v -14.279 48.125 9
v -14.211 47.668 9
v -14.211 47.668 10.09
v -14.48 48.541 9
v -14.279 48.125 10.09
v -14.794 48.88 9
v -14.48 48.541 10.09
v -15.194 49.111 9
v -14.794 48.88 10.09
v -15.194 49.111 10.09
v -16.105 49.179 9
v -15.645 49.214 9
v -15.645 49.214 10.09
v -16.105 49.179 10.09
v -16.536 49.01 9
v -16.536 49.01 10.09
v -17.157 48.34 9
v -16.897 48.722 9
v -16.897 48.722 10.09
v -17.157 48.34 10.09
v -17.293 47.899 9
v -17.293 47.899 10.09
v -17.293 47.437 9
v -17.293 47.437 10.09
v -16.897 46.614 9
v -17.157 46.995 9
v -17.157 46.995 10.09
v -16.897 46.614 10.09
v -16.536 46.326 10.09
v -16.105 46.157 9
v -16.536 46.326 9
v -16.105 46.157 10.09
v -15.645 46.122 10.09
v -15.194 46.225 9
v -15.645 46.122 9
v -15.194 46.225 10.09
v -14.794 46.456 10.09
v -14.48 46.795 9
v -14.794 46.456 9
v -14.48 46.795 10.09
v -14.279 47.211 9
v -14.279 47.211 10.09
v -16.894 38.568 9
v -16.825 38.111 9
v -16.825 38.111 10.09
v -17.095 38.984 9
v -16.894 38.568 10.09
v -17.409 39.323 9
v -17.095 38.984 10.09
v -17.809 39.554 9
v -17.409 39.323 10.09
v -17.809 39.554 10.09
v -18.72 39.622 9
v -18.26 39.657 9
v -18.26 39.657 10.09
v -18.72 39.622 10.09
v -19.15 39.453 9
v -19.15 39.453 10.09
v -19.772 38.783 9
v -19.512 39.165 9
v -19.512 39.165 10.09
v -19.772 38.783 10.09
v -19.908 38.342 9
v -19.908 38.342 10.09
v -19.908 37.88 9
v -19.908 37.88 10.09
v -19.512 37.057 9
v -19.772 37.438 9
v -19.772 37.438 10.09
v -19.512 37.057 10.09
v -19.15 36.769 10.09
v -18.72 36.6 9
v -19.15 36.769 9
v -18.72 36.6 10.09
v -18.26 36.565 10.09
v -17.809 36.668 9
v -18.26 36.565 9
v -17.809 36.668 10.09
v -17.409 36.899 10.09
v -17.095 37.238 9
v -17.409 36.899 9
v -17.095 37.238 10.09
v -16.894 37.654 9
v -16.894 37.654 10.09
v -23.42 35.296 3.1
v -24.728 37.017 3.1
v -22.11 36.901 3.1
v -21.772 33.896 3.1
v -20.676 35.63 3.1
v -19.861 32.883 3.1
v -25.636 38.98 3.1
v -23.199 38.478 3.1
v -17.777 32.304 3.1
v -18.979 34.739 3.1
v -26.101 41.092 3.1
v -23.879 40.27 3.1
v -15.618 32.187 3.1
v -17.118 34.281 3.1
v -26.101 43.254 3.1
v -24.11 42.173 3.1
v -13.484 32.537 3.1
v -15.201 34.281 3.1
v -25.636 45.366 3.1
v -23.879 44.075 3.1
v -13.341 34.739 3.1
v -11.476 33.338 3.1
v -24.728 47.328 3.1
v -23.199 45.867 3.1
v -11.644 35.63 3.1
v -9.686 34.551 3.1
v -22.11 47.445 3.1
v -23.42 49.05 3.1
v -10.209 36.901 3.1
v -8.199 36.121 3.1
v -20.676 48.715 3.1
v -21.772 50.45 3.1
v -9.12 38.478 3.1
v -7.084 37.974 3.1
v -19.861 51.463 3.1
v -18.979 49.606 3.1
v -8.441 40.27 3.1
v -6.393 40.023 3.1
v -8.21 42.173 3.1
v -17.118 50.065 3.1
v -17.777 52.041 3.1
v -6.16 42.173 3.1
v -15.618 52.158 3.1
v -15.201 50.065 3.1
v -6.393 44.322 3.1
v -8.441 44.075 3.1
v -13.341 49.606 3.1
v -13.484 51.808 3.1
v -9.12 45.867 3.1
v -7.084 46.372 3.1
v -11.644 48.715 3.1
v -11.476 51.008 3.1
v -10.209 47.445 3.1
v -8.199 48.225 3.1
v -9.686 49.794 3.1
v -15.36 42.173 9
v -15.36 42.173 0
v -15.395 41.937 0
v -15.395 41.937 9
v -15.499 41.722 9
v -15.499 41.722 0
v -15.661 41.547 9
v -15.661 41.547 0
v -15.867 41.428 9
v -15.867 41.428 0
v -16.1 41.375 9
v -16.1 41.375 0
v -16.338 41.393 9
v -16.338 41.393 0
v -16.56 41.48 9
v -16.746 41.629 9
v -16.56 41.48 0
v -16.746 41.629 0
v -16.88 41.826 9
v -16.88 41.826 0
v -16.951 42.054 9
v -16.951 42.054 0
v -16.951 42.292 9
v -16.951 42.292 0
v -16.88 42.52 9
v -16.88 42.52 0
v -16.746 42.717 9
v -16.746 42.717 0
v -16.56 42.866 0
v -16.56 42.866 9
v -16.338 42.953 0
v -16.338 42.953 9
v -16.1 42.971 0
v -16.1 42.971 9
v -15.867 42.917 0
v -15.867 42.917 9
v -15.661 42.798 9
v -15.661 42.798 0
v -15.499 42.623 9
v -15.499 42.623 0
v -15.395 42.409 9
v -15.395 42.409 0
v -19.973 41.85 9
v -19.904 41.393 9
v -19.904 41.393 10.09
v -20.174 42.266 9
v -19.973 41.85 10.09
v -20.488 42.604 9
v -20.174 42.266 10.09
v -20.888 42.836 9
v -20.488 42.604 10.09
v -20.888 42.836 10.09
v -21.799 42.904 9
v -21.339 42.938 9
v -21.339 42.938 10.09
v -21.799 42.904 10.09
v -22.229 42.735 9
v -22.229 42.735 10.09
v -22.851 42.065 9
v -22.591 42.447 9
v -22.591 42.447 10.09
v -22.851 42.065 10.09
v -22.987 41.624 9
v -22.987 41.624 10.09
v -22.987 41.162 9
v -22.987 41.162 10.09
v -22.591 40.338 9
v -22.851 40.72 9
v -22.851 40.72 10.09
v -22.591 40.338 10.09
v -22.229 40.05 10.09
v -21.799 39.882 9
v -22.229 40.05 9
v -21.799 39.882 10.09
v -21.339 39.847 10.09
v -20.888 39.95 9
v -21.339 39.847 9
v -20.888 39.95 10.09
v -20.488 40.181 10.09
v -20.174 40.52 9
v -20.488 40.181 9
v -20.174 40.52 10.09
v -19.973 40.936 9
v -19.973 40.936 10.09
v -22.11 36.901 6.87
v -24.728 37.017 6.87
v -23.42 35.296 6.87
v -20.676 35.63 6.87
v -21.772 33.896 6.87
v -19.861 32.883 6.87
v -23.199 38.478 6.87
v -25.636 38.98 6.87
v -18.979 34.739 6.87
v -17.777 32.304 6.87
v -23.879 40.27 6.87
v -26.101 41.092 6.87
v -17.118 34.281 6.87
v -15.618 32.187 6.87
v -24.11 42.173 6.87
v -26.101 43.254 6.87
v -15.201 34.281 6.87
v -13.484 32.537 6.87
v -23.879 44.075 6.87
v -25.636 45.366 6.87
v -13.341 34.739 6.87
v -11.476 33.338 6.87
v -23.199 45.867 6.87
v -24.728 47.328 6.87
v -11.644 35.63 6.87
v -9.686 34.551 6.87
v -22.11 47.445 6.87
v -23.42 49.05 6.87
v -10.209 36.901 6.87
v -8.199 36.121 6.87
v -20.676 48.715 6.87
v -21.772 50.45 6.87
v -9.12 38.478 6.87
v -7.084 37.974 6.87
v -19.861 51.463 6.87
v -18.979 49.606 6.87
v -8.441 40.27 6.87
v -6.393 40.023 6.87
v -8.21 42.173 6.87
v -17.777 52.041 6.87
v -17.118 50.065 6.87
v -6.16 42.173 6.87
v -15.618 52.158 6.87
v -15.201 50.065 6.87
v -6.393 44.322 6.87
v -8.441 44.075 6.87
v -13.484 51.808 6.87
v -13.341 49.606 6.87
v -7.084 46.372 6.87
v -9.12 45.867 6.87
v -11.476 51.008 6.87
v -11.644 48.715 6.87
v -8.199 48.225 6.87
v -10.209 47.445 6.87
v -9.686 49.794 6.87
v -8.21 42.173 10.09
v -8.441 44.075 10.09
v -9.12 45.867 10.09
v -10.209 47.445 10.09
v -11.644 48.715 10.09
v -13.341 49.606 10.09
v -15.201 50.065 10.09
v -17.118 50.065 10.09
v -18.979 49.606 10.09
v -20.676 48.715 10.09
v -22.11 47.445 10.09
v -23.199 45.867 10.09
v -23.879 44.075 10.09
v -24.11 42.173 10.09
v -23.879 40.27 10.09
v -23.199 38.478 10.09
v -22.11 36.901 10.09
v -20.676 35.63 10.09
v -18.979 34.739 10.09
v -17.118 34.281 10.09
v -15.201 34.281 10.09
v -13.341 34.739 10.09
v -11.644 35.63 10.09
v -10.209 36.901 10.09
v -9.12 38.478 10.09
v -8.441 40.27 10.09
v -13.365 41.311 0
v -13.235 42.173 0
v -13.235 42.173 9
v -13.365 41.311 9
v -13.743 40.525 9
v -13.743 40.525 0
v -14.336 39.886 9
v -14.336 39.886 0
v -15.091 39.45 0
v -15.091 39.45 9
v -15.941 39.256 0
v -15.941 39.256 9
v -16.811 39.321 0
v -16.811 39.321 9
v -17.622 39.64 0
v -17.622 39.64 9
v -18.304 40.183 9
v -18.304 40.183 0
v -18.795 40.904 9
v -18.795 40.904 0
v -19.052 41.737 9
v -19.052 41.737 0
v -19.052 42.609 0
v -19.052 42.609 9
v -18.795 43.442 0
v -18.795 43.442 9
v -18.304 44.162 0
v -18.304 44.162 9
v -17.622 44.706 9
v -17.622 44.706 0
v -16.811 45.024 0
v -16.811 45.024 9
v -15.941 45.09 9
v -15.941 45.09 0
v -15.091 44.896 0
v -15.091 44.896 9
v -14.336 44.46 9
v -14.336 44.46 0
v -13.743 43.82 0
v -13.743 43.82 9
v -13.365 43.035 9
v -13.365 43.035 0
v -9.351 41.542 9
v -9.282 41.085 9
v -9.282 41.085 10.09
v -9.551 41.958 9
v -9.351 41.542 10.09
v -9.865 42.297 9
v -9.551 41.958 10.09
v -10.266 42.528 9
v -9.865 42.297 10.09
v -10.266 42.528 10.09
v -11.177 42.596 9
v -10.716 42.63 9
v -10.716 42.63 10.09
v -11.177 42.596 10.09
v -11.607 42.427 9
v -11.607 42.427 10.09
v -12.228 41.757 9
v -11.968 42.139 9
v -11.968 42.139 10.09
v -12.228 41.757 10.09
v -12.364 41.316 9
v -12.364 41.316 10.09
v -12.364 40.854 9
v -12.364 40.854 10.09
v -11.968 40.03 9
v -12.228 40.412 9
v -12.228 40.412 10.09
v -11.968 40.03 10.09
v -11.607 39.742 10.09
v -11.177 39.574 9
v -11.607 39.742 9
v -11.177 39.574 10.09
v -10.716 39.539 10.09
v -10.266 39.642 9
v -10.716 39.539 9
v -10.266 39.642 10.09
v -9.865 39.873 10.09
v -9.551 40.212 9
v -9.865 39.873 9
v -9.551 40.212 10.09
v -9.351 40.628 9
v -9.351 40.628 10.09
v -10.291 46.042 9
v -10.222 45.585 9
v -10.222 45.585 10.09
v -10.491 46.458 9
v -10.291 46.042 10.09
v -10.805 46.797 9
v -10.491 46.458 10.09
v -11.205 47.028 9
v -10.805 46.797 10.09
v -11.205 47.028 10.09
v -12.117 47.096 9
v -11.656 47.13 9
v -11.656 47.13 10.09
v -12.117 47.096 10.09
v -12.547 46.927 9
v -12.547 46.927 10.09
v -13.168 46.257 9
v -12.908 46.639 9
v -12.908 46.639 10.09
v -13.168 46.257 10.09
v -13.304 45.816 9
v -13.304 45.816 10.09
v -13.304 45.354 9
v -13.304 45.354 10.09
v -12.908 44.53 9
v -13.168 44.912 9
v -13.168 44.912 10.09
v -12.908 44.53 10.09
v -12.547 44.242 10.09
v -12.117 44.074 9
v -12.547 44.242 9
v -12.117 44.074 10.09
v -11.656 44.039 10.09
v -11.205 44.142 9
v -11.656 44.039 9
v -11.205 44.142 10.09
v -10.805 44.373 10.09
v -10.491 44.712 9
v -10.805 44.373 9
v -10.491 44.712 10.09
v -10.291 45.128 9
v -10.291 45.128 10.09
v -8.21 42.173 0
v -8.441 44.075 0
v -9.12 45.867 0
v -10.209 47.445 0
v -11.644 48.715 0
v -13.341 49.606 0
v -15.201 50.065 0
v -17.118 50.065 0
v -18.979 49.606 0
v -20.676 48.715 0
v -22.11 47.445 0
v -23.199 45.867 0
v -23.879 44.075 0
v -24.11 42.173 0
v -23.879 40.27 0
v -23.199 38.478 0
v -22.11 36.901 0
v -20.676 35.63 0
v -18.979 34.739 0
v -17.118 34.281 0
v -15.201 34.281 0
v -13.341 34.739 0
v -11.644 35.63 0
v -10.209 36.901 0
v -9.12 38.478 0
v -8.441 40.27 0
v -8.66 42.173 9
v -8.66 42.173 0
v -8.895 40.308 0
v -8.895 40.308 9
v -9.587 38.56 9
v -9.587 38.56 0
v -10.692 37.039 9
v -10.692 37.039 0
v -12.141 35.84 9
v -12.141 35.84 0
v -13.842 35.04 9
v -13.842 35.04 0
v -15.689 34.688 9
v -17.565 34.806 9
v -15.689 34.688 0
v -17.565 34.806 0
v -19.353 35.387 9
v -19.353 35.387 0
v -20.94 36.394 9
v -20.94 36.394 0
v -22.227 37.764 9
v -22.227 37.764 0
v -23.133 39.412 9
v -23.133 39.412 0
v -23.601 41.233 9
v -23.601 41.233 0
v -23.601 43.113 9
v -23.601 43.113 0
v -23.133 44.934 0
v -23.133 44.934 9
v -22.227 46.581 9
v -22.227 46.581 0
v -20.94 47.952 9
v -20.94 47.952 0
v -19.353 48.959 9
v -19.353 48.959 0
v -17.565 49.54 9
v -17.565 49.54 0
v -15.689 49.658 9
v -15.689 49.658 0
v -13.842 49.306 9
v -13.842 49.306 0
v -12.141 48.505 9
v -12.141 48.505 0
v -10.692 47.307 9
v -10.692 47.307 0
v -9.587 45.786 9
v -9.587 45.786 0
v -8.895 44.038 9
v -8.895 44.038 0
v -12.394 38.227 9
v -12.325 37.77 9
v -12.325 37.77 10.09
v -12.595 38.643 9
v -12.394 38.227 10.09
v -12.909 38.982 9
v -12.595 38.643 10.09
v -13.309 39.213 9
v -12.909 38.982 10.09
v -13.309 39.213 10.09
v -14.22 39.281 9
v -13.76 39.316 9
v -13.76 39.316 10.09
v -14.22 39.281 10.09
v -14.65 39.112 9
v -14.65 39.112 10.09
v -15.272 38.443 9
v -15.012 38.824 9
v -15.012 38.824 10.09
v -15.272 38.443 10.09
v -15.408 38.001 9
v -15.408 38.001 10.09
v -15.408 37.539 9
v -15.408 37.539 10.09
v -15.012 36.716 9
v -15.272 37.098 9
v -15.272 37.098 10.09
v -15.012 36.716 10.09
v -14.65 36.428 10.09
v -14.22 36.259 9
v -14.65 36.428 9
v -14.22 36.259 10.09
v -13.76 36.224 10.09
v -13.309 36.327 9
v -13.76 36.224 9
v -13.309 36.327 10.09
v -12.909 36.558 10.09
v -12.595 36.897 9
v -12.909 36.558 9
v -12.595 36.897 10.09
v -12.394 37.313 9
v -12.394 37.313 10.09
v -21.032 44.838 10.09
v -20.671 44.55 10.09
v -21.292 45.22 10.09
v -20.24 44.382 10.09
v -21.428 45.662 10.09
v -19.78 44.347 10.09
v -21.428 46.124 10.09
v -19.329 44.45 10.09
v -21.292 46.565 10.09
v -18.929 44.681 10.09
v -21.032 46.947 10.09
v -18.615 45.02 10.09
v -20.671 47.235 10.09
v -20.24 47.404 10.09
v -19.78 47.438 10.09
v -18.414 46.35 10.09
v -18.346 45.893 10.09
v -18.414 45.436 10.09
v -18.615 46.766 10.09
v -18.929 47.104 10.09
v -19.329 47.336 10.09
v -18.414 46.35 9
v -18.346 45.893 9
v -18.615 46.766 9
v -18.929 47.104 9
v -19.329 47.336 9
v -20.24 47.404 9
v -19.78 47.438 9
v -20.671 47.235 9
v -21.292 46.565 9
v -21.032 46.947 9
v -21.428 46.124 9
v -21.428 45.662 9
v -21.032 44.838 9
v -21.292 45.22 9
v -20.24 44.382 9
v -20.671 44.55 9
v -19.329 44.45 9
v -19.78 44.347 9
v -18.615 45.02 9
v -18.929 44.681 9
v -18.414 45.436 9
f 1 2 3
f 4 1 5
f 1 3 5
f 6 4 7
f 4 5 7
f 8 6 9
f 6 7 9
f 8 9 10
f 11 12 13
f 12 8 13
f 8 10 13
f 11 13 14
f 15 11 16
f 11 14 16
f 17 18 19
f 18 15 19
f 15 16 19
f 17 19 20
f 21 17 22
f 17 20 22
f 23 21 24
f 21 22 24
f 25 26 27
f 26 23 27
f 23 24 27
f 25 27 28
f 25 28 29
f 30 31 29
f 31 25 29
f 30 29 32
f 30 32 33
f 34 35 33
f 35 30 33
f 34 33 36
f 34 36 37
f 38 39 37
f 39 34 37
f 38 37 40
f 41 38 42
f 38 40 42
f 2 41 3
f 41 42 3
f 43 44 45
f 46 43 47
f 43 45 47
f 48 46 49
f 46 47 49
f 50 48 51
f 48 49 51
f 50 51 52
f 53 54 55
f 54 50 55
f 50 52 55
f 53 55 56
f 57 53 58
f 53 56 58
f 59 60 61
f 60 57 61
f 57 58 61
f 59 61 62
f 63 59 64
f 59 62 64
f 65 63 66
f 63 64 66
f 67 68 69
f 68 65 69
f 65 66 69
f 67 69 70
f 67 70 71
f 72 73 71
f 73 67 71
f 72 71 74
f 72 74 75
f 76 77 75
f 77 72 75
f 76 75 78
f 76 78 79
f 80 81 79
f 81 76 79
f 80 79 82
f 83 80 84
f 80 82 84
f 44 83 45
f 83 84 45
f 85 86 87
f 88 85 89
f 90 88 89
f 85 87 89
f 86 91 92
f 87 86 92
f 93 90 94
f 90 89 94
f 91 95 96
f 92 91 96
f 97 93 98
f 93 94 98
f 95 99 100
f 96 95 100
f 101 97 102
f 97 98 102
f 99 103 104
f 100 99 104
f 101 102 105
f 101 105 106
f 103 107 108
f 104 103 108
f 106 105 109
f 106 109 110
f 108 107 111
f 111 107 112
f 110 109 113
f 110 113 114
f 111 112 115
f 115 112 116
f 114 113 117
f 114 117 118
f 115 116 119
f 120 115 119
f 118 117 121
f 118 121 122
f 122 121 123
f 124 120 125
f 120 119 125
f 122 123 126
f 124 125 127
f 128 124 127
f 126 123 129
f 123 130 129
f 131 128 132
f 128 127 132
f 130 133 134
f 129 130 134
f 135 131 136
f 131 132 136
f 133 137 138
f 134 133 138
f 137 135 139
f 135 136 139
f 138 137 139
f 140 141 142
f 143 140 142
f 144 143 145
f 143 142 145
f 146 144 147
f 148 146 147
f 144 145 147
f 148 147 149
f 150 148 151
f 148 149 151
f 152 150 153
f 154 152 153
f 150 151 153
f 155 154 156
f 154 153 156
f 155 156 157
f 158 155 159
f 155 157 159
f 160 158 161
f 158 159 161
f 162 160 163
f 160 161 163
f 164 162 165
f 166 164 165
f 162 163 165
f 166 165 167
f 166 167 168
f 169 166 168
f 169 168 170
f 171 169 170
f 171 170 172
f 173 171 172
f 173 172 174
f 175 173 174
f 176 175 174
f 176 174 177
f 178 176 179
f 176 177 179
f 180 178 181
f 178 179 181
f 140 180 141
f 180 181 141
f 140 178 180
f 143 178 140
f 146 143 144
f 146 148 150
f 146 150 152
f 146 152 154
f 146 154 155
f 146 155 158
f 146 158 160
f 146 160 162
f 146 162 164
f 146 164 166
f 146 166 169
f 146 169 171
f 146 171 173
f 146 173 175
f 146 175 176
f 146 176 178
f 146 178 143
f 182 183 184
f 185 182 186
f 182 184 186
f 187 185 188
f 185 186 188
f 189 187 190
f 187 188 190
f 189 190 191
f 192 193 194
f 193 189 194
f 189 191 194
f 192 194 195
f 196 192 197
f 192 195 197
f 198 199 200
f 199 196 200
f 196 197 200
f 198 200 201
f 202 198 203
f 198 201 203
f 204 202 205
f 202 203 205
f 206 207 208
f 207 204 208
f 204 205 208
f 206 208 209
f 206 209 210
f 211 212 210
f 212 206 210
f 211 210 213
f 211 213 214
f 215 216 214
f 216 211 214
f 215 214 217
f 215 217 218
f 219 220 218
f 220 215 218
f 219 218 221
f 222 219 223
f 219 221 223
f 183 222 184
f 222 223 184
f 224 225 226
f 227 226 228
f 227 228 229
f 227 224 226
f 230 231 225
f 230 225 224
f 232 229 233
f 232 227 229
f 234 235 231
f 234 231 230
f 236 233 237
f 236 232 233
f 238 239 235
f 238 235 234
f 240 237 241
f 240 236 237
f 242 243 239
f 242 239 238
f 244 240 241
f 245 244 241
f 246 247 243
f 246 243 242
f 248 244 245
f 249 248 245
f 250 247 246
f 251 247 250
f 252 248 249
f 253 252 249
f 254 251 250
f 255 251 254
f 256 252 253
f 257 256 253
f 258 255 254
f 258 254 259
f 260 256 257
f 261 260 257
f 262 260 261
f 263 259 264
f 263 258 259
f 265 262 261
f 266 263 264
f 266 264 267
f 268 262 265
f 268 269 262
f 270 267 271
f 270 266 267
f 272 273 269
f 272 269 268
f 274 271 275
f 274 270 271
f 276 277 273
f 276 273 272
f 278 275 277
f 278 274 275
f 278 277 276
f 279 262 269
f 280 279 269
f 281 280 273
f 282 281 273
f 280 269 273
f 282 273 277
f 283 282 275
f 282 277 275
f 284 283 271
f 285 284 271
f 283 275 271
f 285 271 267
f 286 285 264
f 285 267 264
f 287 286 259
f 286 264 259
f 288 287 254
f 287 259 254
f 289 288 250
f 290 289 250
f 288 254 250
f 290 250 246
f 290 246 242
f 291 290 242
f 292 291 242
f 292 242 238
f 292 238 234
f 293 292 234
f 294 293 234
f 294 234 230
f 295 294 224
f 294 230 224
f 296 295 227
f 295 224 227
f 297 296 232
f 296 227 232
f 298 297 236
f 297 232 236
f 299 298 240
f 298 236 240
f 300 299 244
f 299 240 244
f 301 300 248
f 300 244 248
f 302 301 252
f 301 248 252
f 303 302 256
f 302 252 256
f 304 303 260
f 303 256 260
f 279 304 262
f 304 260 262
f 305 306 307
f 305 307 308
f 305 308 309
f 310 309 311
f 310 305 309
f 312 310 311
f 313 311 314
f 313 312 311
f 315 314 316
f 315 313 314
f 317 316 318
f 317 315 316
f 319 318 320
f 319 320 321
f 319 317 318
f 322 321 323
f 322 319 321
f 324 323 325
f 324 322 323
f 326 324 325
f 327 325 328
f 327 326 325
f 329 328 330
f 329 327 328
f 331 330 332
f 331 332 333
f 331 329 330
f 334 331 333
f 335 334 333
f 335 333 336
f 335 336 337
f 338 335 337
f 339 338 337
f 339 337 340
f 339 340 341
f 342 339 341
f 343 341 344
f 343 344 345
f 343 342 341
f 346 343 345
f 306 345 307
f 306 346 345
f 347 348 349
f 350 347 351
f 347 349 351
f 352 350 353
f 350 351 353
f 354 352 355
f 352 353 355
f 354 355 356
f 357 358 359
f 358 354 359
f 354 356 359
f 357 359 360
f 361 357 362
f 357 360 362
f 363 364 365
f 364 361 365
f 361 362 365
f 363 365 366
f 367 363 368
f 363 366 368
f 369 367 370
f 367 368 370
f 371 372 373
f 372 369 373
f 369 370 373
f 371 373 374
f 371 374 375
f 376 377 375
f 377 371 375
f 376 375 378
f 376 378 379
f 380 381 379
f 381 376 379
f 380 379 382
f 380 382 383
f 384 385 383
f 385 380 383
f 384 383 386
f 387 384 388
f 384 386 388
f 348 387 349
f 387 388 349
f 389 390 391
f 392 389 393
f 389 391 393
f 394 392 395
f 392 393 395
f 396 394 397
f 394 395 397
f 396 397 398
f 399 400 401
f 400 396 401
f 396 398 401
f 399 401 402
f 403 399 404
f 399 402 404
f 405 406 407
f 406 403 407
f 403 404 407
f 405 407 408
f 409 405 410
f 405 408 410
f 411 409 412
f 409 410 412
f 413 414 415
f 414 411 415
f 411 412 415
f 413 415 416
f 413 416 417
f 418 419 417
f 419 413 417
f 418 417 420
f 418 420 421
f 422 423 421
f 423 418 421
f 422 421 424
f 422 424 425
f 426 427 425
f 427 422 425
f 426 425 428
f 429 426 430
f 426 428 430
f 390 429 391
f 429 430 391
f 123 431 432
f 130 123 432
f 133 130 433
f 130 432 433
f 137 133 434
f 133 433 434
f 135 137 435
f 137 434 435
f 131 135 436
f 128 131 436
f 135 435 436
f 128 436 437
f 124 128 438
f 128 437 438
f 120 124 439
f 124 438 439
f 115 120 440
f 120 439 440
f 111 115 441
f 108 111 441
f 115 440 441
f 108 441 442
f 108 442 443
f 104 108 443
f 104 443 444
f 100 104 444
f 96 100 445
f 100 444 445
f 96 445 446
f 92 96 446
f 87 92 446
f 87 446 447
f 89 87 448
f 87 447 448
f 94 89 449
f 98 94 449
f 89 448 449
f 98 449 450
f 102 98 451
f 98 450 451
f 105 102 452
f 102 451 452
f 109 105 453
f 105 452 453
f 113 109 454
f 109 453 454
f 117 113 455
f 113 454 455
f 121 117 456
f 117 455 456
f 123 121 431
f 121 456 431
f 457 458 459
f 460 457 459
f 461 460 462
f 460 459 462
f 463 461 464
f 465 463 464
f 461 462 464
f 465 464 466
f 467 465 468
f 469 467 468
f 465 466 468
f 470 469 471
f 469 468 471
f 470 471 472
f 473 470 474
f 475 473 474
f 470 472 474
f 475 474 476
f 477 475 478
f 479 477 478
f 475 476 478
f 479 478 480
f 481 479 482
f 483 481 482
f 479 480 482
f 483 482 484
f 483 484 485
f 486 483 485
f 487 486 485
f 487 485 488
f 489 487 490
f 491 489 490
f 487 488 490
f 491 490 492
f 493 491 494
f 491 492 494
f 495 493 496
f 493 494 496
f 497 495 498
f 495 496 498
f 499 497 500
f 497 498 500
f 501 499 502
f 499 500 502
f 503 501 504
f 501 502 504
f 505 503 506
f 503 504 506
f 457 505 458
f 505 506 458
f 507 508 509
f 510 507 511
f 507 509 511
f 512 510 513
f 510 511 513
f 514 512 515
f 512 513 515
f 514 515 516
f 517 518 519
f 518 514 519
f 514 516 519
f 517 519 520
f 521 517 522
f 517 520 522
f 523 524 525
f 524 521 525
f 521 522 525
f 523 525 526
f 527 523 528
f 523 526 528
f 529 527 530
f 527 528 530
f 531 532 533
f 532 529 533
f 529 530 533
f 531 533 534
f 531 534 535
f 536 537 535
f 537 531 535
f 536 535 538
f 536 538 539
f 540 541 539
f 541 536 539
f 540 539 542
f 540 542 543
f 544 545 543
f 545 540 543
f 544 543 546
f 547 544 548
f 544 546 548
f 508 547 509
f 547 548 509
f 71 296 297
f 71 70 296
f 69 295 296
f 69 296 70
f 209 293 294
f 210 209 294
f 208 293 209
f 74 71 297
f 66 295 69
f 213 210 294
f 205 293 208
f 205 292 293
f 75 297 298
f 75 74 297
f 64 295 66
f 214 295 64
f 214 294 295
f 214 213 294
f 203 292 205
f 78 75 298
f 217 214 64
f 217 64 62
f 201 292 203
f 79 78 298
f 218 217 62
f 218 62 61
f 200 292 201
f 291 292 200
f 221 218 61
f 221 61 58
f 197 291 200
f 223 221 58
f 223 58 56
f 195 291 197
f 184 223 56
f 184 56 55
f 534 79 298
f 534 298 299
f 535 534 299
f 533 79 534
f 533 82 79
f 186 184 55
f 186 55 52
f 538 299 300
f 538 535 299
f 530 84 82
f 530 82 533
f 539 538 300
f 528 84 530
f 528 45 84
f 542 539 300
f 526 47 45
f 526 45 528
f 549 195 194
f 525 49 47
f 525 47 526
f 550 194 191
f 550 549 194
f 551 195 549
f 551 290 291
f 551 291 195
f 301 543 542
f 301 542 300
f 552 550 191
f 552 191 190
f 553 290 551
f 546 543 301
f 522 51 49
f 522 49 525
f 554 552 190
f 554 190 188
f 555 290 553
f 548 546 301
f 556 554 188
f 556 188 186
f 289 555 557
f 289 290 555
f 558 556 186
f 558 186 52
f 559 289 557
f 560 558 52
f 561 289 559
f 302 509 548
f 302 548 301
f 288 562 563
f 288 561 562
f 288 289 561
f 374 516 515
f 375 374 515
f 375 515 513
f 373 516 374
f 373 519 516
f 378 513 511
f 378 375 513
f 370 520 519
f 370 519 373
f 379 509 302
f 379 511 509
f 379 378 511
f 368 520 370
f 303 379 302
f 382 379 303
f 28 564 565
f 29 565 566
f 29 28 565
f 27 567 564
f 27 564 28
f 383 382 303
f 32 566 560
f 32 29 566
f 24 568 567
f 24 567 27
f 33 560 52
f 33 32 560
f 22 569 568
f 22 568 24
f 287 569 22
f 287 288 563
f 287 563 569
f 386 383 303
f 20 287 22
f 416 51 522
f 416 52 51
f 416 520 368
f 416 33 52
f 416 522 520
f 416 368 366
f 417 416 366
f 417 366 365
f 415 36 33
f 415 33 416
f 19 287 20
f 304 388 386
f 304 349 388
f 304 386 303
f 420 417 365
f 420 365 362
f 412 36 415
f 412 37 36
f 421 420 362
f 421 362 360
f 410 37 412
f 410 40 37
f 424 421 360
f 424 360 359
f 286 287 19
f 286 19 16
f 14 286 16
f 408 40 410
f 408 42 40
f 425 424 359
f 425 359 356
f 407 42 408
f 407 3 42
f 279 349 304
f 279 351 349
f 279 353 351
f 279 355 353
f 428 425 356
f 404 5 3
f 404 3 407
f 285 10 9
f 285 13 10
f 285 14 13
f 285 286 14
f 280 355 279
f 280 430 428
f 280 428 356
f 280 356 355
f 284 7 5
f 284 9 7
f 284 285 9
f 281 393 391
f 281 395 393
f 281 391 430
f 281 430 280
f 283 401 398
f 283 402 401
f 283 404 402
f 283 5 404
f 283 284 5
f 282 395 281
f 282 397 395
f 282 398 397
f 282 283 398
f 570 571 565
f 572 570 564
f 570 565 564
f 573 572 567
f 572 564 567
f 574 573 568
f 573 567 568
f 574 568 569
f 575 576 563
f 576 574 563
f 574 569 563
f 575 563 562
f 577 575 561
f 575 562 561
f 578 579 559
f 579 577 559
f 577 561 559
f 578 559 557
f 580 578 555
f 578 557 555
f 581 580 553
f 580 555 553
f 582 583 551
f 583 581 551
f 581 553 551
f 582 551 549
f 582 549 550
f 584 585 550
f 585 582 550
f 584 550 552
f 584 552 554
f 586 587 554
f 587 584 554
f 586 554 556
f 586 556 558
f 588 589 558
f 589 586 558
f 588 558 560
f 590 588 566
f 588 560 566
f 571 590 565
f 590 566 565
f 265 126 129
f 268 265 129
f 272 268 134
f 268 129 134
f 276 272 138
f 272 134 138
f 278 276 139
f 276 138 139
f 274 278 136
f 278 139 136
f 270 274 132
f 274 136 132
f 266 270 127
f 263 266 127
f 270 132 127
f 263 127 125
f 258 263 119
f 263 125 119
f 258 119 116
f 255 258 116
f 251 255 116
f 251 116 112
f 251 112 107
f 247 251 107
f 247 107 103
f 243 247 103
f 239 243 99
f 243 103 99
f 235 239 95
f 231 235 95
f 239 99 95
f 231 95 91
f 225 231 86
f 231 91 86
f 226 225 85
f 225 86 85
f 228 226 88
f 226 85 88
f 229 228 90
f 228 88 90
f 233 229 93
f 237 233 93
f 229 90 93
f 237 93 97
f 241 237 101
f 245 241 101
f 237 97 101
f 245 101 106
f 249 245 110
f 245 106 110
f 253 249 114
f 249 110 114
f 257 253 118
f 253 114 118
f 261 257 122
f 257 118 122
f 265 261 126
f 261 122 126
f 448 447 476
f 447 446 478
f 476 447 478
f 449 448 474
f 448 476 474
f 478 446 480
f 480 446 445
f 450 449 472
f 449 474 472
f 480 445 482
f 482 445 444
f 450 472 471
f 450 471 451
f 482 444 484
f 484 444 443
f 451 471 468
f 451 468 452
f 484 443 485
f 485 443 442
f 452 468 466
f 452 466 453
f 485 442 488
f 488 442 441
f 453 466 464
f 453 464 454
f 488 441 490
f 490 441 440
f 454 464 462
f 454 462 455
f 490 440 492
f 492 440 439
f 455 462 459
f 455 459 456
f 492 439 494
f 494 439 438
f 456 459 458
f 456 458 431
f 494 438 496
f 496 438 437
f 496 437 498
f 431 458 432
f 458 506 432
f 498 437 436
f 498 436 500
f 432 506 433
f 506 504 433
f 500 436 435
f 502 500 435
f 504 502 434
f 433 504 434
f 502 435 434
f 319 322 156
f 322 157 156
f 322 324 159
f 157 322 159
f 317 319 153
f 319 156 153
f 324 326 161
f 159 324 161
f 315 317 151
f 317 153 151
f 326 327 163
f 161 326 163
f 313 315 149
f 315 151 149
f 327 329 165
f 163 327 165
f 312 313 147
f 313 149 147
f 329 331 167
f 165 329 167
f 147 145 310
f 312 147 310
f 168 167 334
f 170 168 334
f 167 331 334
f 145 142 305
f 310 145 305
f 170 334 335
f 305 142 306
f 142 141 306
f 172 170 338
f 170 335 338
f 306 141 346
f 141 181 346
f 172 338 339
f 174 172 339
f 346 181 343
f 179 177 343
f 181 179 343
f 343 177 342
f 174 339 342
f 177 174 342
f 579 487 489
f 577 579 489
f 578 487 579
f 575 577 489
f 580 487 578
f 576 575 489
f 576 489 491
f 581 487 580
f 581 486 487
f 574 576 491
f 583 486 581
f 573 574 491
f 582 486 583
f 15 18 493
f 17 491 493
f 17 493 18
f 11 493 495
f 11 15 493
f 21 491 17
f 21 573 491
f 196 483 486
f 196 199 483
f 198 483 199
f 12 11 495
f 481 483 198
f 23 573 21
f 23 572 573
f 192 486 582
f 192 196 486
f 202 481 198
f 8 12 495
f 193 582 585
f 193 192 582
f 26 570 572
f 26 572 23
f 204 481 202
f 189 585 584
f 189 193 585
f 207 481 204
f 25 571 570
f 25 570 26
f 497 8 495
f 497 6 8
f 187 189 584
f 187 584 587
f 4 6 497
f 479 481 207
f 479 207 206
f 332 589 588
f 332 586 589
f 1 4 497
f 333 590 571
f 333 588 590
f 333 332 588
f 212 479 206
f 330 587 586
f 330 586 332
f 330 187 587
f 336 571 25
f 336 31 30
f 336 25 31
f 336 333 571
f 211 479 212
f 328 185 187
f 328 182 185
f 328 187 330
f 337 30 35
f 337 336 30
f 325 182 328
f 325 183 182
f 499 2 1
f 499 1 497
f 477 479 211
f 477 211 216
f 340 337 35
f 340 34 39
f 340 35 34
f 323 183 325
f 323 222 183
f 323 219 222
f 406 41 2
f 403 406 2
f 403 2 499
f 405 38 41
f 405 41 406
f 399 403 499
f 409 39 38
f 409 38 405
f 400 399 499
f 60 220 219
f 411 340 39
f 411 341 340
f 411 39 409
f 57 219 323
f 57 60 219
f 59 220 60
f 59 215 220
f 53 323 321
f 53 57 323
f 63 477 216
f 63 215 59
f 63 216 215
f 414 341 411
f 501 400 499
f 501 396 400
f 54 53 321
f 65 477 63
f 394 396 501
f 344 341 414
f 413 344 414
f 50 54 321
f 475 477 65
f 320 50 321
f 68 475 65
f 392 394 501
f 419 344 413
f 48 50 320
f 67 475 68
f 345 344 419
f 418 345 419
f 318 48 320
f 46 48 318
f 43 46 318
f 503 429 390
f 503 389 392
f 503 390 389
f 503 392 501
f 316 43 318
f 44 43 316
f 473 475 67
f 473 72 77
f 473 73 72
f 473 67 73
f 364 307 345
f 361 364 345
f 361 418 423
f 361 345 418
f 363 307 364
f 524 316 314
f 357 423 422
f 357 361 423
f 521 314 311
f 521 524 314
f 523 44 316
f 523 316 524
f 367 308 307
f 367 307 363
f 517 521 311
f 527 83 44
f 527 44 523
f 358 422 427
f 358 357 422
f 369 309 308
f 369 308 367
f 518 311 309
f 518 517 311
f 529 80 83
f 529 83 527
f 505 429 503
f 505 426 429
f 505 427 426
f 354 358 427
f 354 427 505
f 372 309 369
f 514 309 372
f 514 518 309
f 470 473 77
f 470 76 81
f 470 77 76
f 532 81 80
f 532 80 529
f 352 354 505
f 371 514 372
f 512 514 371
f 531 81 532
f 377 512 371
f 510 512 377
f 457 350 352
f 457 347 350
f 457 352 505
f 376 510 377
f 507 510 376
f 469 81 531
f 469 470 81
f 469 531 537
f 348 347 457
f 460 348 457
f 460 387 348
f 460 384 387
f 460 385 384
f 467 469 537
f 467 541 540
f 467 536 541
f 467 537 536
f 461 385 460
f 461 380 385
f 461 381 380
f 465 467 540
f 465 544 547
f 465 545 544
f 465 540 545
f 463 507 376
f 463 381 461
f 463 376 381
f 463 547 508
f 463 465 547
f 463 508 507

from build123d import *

# Parameters (mm, degrees)
F0_R     = 7.95
F1_DEPTH = 3.1
F2_R     = 10
F3_DEPTH = 3.77
F4_R     = 7.95
F5_DEPTH = 3.22
F6_R     = 1.55
F7_DEPTH = 25
F8_R     = 7.5
F8_R_2   = 1.55
F8_R_3   = 2.925
F8_R_4   = 0.8
F9_DEPTH = 9


with BuildPart() as f1:
    # F0 (on Top) → F1 (new body)
    with BuildSketch(Plane.XY):
        with Locations((-16.1596555263, 42.1727597713)):
            Circle(F0_R)
    extrude(amount=F1_DEPTH)

    # F2 (on face) → F3 (join)
    with BuildSketch(Plane.XY.offset(3.1)):
        with Locations((-16.1596555263, 42.1727597713)):
            Circle(F2_R)
    extrude(amount=F3_DEPTH)

    # F4 (on face) → F5 (join)
    with BuildSketch(Plane.XY.offset(6.87)):
        with Locations((-16.1596555263, 42.1727597713)):
            Circle(F4_R)
    extrude(amount=F5_DEPTH)

    # F6 (on face) → F7 (cut)
    with BuildSketch(Plane.XY.offset(10.09)):
        with Locations((-15.7605068353, 47.6678920378)):
            Circle(F6_R)
        with Locations((-19.8955421826, 45.8926504552)):
            Circle(F6_R)
        with Locations((-21.4543696493, 41.3926504552)):
            Circle(F6_R)
        with Locations((-18.3753594756, 38.1109289024)):
            Circle(F6_R)
        with Locations((-13.8753594756, 37.7701377139)):
            Circle(F6_R)
        with Locations((-10.8317825943, 41.0847477615)):
            Circle(F6_R)
        with Locations((-11.7717087802, 45.5847477615)):
            Circle(F6_R)
    extrude(amount=-F7_DEPTH, mode=Mode.SUBTRACT)

    # F8 (on face) → F9 (cut)
    with BuildSketch(Plane(origin=(0, 0, 0), x_dir=(1, 0, 0), z_dir=(0, 0, -1))):
        with Locations((-16.1596555263, -42.1727597713)):
            Circle(F8_R)
        with Locations((-19.8955421826, -45.8926504552)):
            Circle(F8_R_2, mode=Mode.SUBTRACT)
        with Locations((-16.1596555263, -42.1727597713)):
            Circle(F8_R_3, mode=Mode.SUBTRACT)
        with Locations((-15.7605068353, -47.6678920378)):
            Circle(F8_R_2, mode=Mode.SUBTRACT)
        with Locations((-11.7717087802, -45.5847477615)):
            Circle(F8_R_2, mode=Mode.SUBTRACT)
        with Locations((-21.4543696493, -41.3926504552)):
            Circle(F8_R_2, mode=Mode.SUBTRACT)
        with Locations((-18.3753594756, -38.1109289024)):
            Circle(F8_R_2, mode=Mode.SUBTRACT)
        with Locations((-10.8317825943, -41.0847477615)):
            Circle(F8_R_2, mode=Mode.SUBTRACT)
        with Locations((-13.8753594756, -37.7701377139)):
            Circle(F8_R_2, mode=Mode.SUBTRACT)
        with Locations((-16.1596555263, -42.1727597713)):
            Circle(F8_R_4)
    extrude(amount=-F9_DEPTH, mode=Mode.SUBTRACT)


solid = f1.part
